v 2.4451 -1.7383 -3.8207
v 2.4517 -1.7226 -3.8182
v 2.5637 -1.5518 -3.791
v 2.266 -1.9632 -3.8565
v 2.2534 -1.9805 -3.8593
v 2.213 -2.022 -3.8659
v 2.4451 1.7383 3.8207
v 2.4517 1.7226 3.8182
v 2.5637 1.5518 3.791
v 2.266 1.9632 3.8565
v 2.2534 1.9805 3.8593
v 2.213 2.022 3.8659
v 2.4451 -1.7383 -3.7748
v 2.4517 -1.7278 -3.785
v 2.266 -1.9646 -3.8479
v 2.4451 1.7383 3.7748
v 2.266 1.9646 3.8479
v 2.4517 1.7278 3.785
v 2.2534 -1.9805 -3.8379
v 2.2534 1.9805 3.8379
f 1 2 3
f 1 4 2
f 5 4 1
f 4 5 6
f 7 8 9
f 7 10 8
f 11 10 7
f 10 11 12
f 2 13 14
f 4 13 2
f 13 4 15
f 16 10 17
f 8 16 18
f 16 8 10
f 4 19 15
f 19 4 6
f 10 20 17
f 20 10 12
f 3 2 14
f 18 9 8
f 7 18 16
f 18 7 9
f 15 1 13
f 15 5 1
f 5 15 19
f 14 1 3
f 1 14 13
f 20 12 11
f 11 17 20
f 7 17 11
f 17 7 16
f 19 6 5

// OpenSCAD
$fa=0.1;
$fs=.31;

rod_diameter = 6;
bearing_od = 22;
bearing_id = 8;
bearing_width = 7;
thread_pitch = 3;
rod_length=300;

//module rod(diameter=rod_diameter, length=rod_length)
//nvm that's just a cylinder

module bearing(od=bearing_od, id=bearing_id, width=bearing_width,center=false){
    difference(){
        cylinder(d=od,h=width, center=center);
        translate([0,0,(center? 0: -.1)]) cylinder(d=id,h=width+.2, center=center);
    }
}

//bearing();
module demo() intersection(){
    epsilon=.18;
    twist = atan2(thread_pitch, rod_diameter*PI);
    //for(azimuth=[0,120,240]){
    for(azimuth=[0]){
        rotate([0,0,azimuth])
            translate([rod_diameter/2-bearing_id/2+epsilon,0,0])
            rotate([twist,0,0])
            bearing(center=true);
    }
    cylinder(d=rod_diameter, h=rod_length, center=true);
}

/*
we're interested in finding the relation of the following variables:

* h: height of the bearing
* id: id of the bearing
* p: twist/thread pitch
* d: diameter of the rod
* c: distance from the center of the rod

we intend to solve for ?

multiple coordinate systems include cylindrical, parameterized, cartesian...
we need to find a point in space that lies on the edge of the bearing
and the surface of the rod.

let a= atan2(p,pi*d) //a is small
d = 2*min_r translate([c,0,0]) rotate([a,0,0]) translate([0,0,h/2]) circle(d=id)
(1) x(t)=id/2*cos(t), y=id/2*sin(t), z=0, t=[0,2*pi]
(2) x(t)=id/2*cos(t), y=id/2*sin(t), z=h/2, t=[0,2*pi]
(3) y(t) = cos(a)*old_y-sin(a)*old_z
(3) x(t)=id/2*cos(t), y=id/2*sin(t)*cos(a)-sin(a)*h/2, z=who cares, t=[0,2*pi]
(4) x(t)=id/2*cos(t)+c, y=id/2*sin(t)*cos(a)-sin(a)*h/2, t=[0,2*pi]
(5) maximize r^2 = xx+yy
(5) maximize (id/2*cos(t)+c)^2 + (id/2*sin(t)*cos(a)-sin(a)*h/2)^2
(6) let x = id for wolfram alpha
(6) zeros of (-x*sin(t)*(c+1/2*x*cos(t))) + (1/2*x*cos(a)*cos(t)*(x*cos(a)*sin(t) - h*sin(a)))
(6) ...
(6) just use newton's method idk
(7) let u = cos(t), sin(t) = sin(invcos(u)) = sqrt(1-u^2)
(7) zeros of (-x*sqrt(1-u^2)*(c+1/2*x*u)) + (1/2*x*cos(a)*u*(x*cos(a)*sqrt(1-u^2) - h*sin(a)))
(7) ...
(7) u = c/(x (cos^2(a) - 1)) - 1/2 sqrt(((-1728 x^2 (cos^2(a) - 1)^2 c^4 ... // continues for 7000 characters
    d = (id/2*u+c)^2 + (id/2*sqrt(1-u^2)*cos(a)-sin(a)*h/2)^2
(8) no but really just use newton's method
 */

demo();
